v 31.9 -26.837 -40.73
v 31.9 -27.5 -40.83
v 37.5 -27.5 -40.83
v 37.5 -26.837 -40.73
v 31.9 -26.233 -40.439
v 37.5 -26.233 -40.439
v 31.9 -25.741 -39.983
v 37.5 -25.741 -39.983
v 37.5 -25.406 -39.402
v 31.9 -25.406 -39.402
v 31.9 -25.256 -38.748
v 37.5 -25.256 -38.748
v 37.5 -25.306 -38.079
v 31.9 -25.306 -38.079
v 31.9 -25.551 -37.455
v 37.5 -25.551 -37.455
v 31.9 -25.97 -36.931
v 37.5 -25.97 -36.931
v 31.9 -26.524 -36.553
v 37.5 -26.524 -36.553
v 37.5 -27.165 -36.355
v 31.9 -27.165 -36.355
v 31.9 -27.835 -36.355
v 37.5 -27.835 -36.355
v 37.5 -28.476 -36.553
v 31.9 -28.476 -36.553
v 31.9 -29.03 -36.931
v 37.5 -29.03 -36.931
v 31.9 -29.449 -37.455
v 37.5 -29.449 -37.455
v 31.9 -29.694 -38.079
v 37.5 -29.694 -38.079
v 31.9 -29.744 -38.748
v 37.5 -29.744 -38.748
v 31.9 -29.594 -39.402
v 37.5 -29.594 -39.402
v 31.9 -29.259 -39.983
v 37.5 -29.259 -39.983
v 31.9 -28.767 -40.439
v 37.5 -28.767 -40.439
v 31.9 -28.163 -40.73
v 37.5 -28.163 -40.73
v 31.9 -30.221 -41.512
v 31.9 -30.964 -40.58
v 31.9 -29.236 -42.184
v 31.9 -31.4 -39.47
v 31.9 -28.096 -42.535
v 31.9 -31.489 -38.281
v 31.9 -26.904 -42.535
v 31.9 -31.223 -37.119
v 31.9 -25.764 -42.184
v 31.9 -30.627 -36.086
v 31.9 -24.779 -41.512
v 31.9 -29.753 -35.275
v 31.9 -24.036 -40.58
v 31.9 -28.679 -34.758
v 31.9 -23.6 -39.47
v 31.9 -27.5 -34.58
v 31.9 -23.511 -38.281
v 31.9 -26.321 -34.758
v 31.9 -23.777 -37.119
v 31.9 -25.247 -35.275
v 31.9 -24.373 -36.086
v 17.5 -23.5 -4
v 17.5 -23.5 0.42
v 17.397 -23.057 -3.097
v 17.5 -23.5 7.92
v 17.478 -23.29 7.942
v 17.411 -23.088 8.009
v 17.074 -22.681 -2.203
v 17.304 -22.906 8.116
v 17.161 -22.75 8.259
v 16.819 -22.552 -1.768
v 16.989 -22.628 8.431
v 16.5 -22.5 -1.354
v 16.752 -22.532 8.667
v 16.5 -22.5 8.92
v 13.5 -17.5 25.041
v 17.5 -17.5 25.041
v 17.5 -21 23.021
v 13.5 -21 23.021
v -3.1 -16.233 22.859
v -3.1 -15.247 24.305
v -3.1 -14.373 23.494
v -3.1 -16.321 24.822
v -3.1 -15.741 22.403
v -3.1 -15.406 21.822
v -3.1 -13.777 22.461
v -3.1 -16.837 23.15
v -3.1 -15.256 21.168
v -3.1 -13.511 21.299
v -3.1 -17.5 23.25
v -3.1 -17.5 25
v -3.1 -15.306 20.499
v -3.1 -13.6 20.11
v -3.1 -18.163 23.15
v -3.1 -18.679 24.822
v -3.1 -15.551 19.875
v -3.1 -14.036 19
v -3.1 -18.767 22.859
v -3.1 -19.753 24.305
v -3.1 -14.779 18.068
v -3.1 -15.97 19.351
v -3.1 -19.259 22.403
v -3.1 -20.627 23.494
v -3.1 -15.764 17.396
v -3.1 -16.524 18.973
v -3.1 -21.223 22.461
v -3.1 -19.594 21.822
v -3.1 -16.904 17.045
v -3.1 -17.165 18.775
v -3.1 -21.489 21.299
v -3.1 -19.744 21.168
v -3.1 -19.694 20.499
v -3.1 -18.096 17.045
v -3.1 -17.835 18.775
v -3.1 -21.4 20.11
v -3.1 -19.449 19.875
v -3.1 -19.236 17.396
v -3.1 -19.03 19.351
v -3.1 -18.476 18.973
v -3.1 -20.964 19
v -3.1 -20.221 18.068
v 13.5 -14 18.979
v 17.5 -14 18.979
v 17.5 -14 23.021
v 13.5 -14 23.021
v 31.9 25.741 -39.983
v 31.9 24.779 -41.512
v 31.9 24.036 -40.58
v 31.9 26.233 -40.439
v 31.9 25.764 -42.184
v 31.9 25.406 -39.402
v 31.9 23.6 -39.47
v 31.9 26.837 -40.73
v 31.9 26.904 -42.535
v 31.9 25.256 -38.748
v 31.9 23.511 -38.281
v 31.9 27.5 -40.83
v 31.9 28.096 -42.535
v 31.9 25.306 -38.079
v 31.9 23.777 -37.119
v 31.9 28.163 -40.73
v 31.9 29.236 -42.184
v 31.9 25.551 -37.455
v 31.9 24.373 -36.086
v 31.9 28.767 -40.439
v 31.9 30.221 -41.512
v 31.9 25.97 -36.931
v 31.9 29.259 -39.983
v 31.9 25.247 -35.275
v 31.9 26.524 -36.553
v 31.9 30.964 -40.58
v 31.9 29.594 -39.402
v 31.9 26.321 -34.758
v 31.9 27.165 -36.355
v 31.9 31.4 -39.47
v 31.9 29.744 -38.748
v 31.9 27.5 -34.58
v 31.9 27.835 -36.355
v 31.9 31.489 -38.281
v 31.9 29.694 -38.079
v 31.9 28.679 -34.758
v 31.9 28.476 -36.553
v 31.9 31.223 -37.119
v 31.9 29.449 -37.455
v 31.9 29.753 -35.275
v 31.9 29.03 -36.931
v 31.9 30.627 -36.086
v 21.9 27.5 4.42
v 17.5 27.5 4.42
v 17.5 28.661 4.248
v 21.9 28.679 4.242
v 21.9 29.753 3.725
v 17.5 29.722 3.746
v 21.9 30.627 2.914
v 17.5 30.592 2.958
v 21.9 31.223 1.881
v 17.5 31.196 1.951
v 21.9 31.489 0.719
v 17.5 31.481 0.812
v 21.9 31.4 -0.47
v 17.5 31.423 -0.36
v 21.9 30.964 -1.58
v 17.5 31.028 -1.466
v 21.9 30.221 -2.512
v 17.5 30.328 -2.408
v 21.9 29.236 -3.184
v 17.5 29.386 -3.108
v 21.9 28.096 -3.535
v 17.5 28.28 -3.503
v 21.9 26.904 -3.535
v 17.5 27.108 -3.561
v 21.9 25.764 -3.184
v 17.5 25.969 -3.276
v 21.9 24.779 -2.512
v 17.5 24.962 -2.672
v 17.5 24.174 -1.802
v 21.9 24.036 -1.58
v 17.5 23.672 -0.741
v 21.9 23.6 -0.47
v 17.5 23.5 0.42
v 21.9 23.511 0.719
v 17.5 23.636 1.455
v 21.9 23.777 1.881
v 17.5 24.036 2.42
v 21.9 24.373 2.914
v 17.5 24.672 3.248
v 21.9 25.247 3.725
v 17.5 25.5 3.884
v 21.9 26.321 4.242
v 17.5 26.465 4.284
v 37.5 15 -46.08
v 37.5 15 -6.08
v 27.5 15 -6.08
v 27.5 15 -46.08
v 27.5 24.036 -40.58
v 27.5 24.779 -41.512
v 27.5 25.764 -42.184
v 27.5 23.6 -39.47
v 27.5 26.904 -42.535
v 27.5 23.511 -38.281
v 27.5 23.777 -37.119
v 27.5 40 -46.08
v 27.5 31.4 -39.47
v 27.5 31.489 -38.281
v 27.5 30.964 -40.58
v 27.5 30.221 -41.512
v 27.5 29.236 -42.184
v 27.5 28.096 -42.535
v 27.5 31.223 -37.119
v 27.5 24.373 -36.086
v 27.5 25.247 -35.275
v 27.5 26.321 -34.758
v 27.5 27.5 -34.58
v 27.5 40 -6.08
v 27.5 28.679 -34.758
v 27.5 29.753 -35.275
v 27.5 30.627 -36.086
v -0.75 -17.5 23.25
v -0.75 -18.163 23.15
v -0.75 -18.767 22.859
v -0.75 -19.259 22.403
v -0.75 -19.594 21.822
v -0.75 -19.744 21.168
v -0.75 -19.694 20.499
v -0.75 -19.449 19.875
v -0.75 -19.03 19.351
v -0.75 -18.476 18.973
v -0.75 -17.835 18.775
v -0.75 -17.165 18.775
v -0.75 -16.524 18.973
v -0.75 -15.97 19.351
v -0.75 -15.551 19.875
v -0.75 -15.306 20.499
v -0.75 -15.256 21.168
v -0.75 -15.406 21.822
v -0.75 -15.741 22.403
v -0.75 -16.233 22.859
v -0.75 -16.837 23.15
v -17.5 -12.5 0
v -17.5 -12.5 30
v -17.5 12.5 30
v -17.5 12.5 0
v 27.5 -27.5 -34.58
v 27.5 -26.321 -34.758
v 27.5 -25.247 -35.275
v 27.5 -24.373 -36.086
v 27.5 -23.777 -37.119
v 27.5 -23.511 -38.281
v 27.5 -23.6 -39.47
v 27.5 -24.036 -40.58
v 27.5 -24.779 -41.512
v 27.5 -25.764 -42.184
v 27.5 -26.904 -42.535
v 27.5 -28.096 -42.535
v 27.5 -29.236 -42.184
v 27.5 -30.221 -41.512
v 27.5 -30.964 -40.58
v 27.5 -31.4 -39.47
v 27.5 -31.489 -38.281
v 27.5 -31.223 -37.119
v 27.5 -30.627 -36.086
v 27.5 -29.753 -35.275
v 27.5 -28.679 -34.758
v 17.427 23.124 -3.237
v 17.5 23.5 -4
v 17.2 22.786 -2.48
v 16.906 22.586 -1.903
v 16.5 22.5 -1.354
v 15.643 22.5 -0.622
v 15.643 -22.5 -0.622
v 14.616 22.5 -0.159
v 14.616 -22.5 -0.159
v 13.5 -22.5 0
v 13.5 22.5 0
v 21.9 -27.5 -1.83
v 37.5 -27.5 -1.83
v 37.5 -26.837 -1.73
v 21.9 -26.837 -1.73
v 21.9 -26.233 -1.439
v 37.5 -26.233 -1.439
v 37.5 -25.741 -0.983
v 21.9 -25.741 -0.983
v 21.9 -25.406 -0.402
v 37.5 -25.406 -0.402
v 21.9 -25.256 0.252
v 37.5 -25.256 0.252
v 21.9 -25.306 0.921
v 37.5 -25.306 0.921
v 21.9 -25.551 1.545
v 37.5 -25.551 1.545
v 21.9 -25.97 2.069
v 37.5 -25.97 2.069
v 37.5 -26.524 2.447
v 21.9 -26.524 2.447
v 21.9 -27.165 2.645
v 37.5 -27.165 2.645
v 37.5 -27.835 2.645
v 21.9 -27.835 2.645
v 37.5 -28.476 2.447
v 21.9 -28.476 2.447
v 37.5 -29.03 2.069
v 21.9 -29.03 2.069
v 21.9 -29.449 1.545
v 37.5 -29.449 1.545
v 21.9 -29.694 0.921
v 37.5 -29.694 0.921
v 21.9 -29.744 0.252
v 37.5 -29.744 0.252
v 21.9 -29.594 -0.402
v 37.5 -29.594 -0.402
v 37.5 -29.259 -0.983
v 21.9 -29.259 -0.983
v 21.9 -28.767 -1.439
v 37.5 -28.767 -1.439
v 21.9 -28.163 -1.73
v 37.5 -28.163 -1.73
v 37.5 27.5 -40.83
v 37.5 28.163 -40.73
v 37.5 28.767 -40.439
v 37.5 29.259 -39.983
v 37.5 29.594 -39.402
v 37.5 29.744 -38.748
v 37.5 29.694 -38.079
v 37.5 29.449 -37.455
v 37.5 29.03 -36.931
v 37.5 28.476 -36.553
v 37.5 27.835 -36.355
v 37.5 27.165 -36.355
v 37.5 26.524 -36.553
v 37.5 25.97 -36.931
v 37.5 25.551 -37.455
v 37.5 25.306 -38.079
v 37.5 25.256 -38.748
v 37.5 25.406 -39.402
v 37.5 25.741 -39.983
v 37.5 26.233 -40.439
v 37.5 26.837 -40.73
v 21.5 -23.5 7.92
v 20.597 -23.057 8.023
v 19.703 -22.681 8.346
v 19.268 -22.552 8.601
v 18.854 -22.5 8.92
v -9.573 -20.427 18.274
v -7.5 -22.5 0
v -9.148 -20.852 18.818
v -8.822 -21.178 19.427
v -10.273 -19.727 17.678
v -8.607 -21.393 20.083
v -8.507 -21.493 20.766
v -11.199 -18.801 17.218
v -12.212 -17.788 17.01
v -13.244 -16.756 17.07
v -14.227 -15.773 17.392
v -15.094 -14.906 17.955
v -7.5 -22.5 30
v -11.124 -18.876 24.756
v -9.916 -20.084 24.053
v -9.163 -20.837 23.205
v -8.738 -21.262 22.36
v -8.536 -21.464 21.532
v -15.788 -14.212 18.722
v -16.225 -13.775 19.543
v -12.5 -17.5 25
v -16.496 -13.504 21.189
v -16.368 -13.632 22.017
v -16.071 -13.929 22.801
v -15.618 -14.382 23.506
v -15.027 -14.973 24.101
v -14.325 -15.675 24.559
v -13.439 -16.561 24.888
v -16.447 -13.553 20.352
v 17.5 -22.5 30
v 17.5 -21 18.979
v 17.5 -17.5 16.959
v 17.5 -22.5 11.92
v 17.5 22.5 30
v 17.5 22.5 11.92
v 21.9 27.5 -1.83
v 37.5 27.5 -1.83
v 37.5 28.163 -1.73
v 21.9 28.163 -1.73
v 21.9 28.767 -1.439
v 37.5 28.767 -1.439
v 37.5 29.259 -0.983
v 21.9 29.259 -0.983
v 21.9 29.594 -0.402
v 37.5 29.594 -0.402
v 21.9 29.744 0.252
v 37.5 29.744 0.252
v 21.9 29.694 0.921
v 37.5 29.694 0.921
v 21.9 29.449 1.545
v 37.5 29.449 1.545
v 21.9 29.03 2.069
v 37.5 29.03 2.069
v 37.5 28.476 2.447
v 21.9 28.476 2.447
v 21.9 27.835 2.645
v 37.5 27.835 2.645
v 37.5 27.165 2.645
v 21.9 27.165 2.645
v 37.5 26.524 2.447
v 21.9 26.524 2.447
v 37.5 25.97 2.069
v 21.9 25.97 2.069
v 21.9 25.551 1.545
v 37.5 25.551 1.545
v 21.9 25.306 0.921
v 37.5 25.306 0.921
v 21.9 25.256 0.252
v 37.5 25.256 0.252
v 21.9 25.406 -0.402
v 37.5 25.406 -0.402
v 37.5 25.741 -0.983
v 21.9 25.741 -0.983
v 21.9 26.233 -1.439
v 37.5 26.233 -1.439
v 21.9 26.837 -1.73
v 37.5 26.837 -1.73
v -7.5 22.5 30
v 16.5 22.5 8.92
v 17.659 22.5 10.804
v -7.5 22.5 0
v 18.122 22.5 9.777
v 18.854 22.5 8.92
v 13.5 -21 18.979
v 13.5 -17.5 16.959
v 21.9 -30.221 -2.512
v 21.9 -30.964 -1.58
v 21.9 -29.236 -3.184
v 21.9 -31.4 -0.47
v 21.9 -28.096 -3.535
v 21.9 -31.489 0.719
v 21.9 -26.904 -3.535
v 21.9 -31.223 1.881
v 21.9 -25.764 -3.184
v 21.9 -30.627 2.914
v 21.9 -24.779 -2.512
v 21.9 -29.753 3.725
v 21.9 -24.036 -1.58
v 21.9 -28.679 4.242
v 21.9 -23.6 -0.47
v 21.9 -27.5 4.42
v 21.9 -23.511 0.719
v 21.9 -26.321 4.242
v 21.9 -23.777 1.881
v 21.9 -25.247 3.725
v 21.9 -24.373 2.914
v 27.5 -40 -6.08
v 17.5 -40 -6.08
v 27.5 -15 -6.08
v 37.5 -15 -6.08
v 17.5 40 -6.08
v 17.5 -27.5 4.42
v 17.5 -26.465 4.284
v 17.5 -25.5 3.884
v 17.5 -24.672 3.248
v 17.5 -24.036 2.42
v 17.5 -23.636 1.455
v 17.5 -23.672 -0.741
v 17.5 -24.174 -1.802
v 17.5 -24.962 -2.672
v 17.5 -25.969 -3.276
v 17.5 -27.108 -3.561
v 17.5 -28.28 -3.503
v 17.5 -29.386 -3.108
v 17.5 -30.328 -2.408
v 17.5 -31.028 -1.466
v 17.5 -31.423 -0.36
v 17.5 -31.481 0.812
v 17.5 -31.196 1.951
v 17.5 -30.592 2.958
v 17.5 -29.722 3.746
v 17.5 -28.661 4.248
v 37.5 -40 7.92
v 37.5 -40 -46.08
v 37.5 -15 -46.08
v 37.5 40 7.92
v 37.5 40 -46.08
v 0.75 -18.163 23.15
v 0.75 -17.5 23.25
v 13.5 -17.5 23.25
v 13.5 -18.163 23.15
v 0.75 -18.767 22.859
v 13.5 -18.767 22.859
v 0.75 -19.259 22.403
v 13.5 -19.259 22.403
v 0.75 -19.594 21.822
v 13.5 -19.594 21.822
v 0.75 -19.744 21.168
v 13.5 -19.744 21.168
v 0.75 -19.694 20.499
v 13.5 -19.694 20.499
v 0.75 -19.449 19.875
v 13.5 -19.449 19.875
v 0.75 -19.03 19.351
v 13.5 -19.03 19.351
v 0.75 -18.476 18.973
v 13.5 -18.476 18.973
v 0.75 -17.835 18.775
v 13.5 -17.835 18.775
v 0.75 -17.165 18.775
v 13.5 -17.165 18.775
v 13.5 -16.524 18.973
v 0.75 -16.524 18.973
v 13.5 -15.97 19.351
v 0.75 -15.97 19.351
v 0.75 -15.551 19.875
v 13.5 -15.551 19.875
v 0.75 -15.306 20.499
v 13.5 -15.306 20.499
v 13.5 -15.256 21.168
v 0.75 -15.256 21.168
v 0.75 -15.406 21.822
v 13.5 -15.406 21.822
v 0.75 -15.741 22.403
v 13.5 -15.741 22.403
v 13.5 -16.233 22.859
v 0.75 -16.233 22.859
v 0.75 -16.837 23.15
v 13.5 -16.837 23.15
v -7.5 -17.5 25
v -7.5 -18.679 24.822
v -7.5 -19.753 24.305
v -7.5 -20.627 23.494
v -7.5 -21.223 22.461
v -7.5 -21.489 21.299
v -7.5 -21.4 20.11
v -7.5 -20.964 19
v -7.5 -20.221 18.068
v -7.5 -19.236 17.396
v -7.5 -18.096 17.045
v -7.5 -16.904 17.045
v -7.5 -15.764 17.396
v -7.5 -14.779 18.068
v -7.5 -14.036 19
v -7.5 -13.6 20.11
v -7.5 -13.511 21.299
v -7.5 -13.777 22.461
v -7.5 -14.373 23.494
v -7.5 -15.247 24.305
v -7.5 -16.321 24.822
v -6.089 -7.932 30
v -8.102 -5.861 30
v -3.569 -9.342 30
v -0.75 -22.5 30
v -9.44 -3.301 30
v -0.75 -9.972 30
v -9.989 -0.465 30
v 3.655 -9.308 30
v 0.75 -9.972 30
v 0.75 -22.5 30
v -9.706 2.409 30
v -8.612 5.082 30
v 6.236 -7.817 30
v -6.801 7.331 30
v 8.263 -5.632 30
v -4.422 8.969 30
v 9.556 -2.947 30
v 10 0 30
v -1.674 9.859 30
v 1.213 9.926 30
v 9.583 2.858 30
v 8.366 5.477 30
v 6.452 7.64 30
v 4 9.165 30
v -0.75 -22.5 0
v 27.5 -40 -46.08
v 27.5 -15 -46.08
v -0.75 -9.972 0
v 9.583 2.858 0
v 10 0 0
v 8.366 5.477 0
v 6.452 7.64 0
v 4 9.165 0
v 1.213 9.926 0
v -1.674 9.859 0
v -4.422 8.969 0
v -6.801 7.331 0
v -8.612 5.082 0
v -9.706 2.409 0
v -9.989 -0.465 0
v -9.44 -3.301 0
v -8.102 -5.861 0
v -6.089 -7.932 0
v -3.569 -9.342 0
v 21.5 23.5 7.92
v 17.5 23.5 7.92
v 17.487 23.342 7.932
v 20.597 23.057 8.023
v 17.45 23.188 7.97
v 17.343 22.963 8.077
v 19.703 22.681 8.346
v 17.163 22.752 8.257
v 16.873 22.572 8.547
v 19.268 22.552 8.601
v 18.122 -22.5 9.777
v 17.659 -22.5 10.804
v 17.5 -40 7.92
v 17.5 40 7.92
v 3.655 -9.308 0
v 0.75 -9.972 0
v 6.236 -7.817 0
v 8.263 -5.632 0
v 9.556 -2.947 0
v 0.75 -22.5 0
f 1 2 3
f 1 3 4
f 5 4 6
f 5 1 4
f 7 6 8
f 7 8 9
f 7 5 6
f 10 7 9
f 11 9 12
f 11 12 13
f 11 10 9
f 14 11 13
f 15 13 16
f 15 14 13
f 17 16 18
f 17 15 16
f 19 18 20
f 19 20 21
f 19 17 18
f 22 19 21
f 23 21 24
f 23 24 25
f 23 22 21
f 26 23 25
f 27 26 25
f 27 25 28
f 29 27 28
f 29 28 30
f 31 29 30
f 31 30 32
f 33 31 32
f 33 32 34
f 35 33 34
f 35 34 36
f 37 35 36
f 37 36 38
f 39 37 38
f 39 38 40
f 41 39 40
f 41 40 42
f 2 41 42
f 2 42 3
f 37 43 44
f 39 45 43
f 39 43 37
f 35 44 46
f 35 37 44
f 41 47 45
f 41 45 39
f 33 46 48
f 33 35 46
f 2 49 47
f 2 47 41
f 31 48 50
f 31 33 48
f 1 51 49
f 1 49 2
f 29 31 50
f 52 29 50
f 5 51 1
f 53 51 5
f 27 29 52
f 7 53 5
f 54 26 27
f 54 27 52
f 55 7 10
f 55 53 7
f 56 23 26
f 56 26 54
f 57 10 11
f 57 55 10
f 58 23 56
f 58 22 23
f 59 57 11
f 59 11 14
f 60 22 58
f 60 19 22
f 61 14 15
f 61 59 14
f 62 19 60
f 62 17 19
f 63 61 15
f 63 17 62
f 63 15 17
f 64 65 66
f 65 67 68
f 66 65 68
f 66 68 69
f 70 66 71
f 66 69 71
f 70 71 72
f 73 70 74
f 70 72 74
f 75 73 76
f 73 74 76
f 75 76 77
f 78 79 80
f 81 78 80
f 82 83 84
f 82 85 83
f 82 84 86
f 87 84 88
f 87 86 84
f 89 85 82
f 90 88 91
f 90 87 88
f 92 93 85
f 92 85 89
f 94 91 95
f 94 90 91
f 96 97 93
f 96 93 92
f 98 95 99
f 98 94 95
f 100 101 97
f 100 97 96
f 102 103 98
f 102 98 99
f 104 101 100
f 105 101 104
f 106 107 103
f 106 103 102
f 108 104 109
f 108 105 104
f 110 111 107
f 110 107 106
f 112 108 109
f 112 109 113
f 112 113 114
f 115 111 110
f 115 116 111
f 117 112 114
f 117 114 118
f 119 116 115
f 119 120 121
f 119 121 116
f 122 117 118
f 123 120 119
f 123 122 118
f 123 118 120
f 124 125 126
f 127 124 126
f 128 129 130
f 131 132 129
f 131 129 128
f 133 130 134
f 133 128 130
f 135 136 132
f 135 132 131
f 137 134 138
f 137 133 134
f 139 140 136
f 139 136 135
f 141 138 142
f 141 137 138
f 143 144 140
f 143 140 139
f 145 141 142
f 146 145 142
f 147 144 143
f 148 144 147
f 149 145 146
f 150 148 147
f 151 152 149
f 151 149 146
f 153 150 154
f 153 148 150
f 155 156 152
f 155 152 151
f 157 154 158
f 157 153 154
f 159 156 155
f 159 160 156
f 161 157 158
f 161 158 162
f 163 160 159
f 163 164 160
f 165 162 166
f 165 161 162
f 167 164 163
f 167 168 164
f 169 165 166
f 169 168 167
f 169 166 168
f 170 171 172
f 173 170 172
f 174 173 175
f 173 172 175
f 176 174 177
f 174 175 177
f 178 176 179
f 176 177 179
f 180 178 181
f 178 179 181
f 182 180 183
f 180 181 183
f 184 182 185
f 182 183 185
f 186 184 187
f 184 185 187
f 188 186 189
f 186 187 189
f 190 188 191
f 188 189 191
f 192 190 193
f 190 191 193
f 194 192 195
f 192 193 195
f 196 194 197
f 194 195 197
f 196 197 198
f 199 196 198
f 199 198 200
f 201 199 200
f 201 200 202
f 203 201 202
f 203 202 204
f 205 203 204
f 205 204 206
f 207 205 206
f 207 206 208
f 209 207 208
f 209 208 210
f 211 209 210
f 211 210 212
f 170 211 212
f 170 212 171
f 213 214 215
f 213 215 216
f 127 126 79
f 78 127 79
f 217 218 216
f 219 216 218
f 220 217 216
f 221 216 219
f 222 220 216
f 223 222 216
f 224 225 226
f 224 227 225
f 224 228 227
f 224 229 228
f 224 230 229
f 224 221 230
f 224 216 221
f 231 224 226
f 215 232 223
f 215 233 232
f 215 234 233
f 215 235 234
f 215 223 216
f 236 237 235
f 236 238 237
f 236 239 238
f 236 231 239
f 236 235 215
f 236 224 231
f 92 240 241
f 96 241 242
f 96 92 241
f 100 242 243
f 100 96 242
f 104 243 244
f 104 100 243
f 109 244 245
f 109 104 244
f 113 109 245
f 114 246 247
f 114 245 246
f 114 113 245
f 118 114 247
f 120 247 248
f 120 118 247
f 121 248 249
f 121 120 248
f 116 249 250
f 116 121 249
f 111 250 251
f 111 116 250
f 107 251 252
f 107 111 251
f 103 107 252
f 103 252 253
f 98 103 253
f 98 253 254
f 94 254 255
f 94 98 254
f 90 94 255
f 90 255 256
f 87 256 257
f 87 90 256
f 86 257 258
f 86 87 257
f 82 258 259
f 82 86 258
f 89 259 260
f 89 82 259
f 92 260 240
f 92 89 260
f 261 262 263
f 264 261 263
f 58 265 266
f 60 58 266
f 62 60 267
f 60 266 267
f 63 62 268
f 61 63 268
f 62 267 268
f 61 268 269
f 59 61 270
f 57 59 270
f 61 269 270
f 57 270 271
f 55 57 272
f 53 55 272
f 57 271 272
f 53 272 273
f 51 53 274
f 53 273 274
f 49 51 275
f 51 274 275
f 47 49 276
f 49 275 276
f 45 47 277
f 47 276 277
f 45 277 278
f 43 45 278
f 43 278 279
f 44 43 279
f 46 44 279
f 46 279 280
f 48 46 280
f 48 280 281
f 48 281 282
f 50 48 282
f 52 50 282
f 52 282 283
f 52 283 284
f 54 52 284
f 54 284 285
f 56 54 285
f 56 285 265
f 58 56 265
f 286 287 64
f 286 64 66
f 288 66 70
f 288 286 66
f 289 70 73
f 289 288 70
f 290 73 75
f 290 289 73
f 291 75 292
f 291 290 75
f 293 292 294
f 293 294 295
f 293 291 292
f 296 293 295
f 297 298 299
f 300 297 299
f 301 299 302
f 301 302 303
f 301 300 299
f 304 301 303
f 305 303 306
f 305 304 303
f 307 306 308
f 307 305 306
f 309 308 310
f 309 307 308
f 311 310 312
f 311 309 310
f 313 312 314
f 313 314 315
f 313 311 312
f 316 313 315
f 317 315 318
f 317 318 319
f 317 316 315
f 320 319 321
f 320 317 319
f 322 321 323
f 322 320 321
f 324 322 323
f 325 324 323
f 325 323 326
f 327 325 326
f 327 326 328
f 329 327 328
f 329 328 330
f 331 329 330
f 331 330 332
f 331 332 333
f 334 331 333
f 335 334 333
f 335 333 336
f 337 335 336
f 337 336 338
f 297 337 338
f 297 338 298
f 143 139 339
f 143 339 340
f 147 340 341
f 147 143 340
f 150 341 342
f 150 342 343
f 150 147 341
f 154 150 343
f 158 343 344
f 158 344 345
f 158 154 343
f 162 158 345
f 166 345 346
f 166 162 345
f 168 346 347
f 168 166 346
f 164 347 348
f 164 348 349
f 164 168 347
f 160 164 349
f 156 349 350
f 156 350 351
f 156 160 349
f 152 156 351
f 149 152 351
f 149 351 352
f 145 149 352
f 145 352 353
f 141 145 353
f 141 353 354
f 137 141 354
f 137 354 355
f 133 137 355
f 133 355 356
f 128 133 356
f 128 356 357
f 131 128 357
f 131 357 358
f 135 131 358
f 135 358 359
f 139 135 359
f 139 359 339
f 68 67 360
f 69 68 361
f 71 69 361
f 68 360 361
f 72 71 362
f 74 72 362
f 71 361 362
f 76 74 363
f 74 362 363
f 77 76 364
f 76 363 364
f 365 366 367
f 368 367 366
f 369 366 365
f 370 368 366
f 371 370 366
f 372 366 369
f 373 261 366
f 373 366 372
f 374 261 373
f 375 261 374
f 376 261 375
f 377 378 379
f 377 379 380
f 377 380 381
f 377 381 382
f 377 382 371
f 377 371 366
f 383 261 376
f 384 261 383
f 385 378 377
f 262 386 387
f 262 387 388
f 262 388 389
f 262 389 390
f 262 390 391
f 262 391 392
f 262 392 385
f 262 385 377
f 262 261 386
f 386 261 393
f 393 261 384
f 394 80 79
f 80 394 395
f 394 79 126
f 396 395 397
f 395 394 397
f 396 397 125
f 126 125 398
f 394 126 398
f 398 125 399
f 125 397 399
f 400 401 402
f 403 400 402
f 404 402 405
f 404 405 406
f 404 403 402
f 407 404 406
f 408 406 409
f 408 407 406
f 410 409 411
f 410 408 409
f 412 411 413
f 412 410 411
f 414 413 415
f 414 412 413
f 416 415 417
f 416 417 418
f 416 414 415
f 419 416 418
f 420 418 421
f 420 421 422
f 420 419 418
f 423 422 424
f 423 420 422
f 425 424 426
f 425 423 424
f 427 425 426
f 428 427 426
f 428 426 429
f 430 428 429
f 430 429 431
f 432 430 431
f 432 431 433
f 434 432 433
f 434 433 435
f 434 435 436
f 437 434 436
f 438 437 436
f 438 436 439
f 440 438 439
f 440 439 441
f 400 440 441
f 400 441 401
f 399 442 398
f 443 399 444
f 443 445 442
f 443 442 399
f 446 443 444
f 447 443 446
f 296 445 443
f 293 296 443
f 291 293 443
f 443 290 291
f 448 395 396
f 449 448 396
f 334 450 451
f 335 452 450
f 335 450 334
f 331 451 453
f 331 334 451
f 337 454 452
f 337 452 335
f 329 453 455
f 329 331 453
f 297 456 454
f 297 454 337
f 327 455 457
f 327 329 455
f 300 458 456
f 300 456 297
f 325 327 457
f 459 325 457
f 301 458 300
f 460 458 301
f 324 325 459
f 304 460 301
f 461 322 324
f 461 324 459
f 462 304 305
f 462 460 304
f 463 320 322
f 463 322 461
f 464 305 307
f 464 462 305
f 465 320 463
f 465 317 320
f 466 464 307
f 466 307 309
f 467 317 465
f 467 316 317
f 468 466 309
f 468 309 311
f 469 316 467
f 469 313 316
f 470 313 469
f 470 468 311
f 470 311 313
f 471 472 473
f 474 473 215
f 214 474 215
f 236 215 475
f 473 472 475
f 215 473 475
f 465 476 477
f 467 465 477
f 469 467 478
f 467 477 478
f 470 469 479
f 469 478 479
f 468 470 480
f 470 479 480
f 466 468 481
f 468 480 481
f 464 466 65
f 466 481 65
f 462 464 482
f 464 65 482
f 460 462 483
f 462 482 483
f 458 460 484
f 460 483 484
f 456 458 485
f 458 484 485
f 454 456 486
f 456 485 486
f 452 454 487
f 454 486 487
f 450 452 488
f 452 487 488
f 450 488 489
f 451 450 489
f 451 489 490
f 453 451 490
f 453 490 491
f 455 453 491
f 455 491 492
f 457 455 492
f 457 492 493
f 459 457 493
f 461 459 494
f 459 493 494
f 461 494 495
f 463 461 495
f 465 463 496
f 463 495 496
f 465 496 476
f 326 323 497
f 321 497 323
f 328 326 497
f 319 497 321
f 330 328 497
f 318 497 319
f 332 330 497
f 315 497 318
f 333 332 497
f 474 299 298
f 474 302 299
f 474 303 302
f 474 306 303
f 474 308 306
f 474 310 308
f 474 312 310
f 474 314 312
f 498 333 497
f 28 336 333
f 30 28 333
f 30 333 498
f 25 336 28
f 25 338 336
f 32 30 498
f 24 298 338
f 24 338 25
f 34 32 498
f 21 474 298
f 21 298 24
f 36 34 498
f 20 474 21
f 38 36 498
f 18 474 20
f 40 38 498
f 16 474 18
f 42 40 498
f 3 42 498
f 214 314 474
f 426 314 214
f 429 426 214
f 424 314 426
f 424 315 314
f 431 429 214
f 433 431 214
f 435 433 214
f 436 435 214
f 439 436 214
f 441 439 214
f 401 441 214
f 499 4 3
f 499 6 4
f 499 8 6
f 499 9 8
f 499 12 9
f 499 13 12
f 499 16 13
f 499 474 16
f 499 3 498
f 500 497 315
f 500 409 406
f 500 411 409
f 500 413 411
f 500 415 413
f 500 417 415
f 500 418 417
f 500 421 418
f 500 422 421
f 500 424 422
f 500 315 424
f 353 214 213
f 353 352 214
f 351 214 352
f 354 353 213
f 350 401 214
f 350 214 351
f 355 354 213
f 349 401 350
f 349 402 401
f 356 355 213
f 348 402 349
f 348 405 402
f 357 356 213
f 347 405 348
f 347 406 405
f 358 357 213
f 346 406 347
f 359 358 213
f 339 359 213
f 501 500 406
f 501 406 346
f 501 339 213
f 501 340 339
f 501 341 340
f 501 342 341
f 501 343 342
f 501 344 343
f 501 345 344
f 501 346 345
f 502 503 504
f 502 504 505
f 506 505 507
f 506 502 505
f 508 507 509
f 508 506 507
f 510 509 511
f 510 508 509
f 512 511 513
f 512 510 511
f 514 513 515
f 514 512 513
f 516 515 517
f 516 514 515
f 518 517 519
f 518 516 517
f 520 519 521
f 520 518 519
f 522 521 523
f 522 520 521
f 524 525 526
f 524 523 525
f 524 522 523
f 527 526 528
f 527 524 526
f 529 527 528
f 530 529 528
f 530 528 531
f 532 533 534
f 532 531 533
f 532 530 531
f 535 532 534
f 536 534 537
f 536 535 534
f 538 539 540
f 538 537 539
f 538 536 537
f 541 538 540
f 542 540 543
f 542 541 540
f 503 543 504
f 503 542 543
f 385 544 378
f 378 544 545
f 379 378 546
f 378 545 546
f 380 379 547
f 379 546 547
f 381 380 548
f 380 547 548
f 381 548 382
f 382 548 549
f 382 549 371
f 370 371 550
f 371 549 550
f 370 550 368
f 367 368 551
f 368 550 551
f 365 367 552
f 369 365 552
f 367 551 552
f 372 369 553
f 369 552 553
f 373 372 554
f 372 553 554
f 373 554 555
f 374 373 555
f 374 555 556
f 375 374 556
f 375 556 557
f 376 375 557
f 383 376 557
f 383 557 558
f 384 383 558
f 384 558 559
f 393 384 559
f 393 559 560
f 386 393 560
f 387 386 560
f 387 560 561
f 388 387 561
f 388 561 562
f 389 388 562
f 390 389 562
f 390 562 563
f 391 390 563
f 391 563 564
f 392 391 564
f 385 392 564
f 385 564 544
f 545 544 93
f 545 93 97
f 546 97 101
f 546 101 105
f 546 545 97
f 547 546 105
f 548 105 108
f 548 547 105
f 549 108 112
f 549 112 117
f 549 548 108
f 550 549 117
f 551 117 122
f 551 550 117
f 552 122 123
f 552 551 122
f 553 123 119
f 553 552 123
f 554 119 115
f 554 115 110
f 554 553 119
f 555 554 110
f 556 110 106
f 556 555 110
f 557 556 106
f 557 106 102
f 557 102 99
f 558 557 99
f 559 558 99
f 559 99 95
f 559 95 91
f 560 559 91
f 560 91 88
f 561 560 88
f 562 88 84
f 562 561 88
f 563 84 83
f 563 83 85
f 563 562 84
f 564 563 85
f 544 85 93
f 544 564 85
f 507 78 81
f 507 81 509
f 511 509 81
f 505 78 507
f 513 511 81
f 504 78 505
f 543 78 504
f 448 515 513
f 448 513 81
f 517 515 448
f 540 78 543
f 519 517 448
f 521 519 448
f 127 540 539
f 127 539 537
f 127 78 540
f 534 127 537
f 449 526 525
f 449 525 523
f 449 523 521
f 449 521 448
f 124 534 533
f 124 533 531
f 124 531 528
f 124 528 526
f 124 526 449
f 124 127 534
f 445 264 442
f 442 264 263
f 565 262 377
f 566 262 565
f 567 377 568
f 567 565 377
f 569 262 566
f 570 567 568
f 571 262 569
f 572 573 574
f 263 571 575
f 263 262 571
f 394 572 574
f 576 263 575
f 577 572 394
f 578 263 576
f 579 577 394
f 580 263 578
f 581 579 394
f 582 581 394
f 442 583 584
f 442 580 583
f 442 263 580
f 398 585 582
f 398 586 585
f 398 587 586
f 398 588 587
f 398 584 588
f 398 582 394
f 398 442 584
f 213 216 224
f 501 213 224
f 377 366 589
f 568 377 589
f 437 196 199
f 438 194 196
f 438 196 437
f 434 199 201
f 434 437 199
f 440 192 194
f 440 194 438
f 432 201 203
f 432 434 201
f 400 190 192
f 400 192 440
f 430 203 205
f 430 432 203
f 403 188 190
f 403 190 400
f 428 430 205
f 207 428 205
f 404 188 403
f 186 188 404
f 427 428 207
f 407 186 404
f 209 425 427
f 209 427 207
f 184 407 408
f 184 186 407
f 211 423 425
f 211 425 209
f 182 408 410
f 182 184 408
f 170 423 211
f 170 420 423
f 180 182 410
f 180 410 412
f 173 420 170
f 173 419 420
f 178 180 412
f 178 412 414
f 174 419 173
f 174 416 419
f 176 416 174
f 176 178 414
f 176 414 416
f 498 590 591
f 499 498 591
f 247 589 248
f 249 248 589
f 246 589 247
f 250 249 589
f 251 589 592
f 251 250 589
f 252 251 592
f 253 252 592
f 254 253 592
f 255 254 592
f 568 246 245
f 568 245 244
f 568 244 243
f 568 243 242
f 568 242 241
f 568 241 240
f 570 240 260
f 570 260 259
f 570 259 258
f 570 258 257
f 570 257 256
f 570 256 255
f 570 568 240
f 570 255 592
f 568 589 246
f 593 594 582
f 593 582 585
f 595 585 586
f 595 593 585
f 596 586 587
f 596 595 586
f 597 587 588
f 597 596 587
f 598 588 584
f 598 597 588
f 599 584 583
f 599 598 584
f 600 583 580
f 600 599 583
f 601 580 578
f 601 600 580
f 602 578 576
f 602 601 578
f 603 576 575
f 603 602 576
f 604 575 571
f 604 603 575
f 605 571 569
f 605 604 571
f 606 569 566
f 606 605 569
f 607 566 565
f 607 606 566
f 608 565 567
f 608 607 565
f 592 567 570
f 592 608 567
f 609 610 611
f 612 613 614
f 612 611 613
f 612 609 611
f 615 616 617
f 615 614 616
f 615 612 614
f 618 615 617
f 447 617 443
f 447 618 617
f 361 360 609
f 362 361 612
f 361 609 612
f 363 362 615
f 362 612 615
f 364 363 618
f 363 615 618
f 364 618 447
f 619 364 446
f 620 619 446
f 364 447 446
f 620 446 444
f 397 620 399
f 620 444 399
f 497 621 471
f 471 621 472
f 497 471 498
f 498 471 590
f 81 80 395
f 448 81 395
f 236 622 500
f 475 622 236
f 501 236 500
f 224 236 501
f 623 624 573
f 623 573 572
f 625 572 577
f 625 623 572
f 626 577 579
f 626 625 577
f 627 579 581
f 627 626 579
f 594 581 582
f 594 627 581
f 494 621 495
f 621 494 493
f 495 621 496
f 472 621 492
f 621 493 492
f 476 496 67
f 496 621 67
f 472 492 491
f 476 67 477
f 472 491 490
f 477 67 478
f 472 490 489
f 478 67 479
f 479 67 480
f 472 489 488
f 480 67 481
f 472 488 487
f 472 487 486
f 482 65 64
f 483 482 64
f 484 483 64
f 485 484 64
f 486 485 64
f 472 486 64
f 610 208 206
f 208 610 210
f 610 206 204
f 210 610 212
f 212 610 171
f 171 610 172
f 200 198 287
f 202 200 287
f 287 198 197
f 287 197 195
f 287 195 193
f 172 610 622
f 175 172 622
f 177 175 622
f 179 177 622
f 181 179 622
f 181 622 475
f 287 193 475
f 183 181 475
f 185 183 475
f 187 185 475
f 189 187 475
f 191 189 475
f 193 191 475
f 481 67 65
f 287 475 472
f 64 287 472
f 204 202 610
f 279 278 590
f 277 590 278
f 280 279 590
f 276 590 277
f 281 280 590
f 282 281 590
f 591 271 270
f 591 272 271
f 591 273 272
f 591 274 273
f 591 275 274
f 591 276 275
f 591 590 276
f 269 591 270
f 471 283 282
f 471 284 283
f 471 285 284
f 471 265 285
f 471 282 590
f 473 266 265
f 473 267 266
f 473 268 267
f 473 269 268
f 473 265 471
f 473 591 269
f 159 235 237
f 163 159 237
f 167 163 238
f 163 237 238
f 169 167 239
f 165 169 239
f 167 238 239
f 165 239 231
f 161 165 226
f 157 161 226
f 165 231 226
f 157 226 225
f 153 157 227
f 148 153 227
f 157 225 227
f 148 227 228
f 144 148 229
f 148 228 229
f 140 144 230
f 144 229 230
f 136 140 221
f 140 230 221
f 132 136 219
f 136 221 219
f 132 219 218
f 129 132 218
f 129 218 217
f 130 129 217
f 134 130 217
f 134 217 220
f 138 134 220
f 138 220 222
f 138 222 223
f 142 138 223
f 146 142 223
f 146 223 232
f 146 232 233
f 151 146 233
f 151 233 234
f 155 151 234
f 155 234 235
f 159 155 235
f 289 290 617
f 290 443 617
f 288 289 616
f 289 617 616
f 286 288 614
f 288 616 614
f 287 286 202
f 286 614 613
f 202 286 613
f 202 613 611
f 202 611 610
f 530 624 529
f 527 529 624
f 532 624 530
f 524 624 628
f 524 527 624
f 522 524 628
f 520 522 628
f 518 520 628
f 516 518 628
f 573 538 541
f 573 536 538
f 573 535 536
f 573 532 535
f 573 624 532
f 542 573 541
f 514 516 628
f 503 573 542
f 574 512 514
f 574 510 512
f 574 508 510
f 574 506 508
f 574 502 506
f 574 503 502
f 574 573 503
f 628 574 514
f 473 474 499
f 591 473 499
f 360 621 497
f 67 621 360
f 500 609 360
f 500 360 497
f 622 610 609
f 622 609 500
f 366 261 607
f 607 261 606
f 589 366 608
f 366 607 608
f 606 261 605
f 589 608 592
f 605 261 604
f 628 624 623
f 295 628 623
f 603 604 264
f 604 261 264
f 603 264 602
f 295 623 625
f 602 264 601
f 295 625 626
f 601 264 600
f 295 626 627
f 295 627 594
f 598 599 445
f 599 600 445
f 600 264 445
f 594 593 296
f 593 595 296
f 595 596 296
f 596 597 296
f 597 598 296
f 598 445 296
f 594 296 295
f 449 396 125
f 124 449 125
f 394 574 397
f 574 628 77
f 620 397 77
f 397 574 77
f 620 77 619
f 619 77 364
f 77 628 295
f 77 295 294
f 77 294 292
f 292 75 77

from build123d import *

# Parameters (mm, degrees)
SKETCH1_W                                         = 35
SKETCH1_H                                         = 45
SKETCH1_R                                         = 10
BOSS_EXTRUDE1_DEPTH                               = 30
SKETCH2_W                                         = 54
SKETCH2_H                                         = 80
SKETCH2_R                                         = 2.25
BOSS_EXTRUDE2_DEPTH                               = 20
SKETCH3_W                                         = 40
SKETCH3_H                                         = 80
CUT_EXTRUDE1_DEPTH                                = 10
SKETCH5_W                                         = 40
SKETCH5_H                                         = 30
CUT_EXTRUDE2_DEPTH                                = 10
FILLET1_R                                         = 4
FILLET2_R                                         = 1
CHAMFER1_SIZE                                     = 10
CUT_EXTRUDE3_DEPTH                                = 4
SKETCH11_R                                        = 4
CUT_EXTRUDE4_DEPTH                                = 76.818013919
CUT_EXTRUDE5_DEPTH                                = 94.778592345
CHAMBRAGE_POUR_VIS_SIX_PANS_CREUX_M42_D           = 4.5
CHAMBRAGE_POUR_VIS_SIX_PANS_CREUX_M42_CBORE_D     = 8
CHAMBRAGE_POUR_VIS_SIX_PANS_CREUX_M42_CBORE_DEPTH = 4.4
CHAMBRAGE_POUR_VIS_SIX_PANS_CREUX_M43_D           = 4.5
CHAMBRAGE_POUR_VIS_SIX_PANS_CREUX_M43_CBORE_D     = 8
CHAMBRAGE_POUR_VIS_SIX_PANS_CREUX_M43_CBORE_DEPTH = 4.4


with BuildPart() as part:
    # Sketch1 → Boss-Extrude1 (new body)
    with BuildSketch(Plane.XY):
        Rectangle(SKETCH1_W, SKETCH1_H)
        Circle(SKETCH1_R, mode=Mode.SUBTRACT)
    extrude(amount=BOSS_EXTRUDE1_DEPTH)

    # Sketch2 → Boss-Extrude2 (add)
    with BuildSketch(Plane(origin=(17.5, 0, 0), x_dir=(0, 0, -1), z_dir=(1, 0, 0))):
        with Locations((19.080052459, 0)):
            Rectangle(SKETCH2_W, SKETCH2_H)
        with Locations((-0.419947541, 27.5)):
            Circle(SKETCH2_R, mode=Mode.SUBTRACT)
        with Locations((38.580052459, 27.5)):
            Circle(SKETCH2_R, mode=Mode.SUBTRACT)
        with Locations((38.580052459, -27.5)):
            Circle(SKETCH2_R, mode=Mode.SUBTRACT)
        with Locations((-0.419947541, -27.5)):
            Circle(SKETCH2_R, mode=Mode.SUBTRACT)
    extrude(amount=BOSS_EXTRUDE2_DEPTH)

    # Sketch3 → Cut-Extrude1 (cut)
    with BuildSketch(Plane.ZY.offset(-17.5)):
        with Locations((-26.080052459, 0)):
            Rectangle(SKETCH3_W, SKETCH3_H)
    extrude(amount=-CUT_EXTRUDE1_DEPTH, mode=Mode.SUBTRACT)

    # Sketch5 → Cut-Extrude2 (cut)
    with BuildSketch(Plane(origin=(37.5, 0, 0), x_dir=(0, 0, -1), z_dir=(1, 0, 0))):
        with Locations((26.080052459, 0)):
            Rectangle(SKETCH5_W, SKETCH5_H)
    extrude(amount=-CUT_EXTRUDE2_DEPTH, mode=Mode.SUBTRACT)

    # Fillet1
    fillet1_edges = [part.edges().sort_by_distance(p)[0] for p in [
        (17.5, 0, 7.919947541),
        (17.5, 0, 0),
    ]]
    fillet(fillet1_edges, radius=FILLET1_R)

    # Fillet2
    fillet2_edges = [part.edges().sort_by_distance(p)[0] for p in [
        (17.5, 22.5, 1.95997377),
        (17.5, -22.5, 1.95997377),
        (19.5, 22.5, 7.919947541),
        (19.5, -22.5, 7.919947541),
    ]]
    fillet(fillet2_edges, radius=FILLET2_R)

    # Chamfer1
    chamfer1_edges = [part.edges().sort_by_distance(p)[0] for p in [
        (-17.5, 22.5, 15),
        (-17.5, -22.5, 15),
    ]]
    chamfer(chamfer1_edges, length=CHAMFER1_SIZE)

    # Sketch6 → Cut-Extrude3 (cut)
    with BuildSketch(Plane(origin=(17.5, 0, 0), x_dir=(0, 0, -1), z_dir=(1, 0, 0))):
        Polygon((-18.979274058, -21), (-16.958548116, -17.5), (-18.979274058, -14), (-23.020725942, -14), (-25.041451884, -17.5), (-23.020725942, -21), align=None)
    extrude(amount=-CUT_EXTRUDE3_DEPTH, mode=Mode.SUBTRACT)

    # Sketch10 → Chambrage pour vis à six pans creux M41 (revolve, cut)
    with BuildSketch(Plane(origin=(-7.5, -17.5, 21), x_dir=(0, 0, 1), z_dir=(0, 1, 0))):
        Polygon((0, 0), (0, 45), (2.25, 45), (2.25, 4.4), (4, 4.4), (4, 0), align=None)
    revolve(axis=Axis((-13.85, -17.5, 21), (1, 0, 0)), mode=Mode.SUBTRACT)

    # Sketch11 → Cut-Extrude4 (cut, through all)
    with BuildSketch(Plane(origin=(-7.5, 0, 0), x_dir=(0, 0, -1), z_dir=(1, 0, 0))):
        with Locations(Location((-21, -17.5, 0), (0, 0, 180))):
            Circle(SKETCH11_R)
    extrude(amount=-CUT_EXTRUDE4_DEPTH, mode=Mode.SUBTRACT)

    # Sketch12 → Cut-Extrude5 (cut, through all)
    with BuildSketch(Plane.XY.offset(30)):
        with BuildLine():
            Line((0.75, -9.971835338), (0.75, -31.545013405))
            Line((0.75, -31.545013405), (-0.75, -31.545013405))
            Line((-0.75, -31.545013405), (-0.75, -9.971835338))
            ThreePointArc((-0.75, -9.971835338), (0, -10), (0.75, -9.971835338))
        make_face()
    extrude(amount=-CUT_EXTRUDE5_DEPTH, mode=Mode.SUBTRACT)

    # Chambrage pour vis à six pans creux M42 (through all)
    with Locations(Plane.ZY.offset(-17.5)):
        with Locations((0.419947541, -27.5), (0.419947541, 27.5)):
            CounterBoreHole(CHAMBRAGE_POUR_VIS_SIX_PANS_CREUX_M42_D / 2, CHAMBRAGE_POUR_VIS_SIX_PANS_CREUX_M42_CBORE_D / 2, CHAMBRAGE_POUR_VIS_SIX_PANS_CREUX_M42_CBORE_DEPTH)

    # Chambrage pour vis à six pans creux M43 (through all)
    with Locations(Plane.ZY.offset(-27.5)):
        with Locations((-38.580052459, 27.5), (-38.580052459, -27.5)):
            CounterBoreHole(CHAMBRAGE_POUR_VIS_SIX_PANS_CREUX_M43_D / 2, CHAMBRAGE_POUR_VIS_SIX_PANS_CREUX_M43_CBORE_D / 2, CHAMBRAGE_POUR_VIS_SIX_PANS_CREUX_M43_CBORE_DEPTH)


solid = part.part
